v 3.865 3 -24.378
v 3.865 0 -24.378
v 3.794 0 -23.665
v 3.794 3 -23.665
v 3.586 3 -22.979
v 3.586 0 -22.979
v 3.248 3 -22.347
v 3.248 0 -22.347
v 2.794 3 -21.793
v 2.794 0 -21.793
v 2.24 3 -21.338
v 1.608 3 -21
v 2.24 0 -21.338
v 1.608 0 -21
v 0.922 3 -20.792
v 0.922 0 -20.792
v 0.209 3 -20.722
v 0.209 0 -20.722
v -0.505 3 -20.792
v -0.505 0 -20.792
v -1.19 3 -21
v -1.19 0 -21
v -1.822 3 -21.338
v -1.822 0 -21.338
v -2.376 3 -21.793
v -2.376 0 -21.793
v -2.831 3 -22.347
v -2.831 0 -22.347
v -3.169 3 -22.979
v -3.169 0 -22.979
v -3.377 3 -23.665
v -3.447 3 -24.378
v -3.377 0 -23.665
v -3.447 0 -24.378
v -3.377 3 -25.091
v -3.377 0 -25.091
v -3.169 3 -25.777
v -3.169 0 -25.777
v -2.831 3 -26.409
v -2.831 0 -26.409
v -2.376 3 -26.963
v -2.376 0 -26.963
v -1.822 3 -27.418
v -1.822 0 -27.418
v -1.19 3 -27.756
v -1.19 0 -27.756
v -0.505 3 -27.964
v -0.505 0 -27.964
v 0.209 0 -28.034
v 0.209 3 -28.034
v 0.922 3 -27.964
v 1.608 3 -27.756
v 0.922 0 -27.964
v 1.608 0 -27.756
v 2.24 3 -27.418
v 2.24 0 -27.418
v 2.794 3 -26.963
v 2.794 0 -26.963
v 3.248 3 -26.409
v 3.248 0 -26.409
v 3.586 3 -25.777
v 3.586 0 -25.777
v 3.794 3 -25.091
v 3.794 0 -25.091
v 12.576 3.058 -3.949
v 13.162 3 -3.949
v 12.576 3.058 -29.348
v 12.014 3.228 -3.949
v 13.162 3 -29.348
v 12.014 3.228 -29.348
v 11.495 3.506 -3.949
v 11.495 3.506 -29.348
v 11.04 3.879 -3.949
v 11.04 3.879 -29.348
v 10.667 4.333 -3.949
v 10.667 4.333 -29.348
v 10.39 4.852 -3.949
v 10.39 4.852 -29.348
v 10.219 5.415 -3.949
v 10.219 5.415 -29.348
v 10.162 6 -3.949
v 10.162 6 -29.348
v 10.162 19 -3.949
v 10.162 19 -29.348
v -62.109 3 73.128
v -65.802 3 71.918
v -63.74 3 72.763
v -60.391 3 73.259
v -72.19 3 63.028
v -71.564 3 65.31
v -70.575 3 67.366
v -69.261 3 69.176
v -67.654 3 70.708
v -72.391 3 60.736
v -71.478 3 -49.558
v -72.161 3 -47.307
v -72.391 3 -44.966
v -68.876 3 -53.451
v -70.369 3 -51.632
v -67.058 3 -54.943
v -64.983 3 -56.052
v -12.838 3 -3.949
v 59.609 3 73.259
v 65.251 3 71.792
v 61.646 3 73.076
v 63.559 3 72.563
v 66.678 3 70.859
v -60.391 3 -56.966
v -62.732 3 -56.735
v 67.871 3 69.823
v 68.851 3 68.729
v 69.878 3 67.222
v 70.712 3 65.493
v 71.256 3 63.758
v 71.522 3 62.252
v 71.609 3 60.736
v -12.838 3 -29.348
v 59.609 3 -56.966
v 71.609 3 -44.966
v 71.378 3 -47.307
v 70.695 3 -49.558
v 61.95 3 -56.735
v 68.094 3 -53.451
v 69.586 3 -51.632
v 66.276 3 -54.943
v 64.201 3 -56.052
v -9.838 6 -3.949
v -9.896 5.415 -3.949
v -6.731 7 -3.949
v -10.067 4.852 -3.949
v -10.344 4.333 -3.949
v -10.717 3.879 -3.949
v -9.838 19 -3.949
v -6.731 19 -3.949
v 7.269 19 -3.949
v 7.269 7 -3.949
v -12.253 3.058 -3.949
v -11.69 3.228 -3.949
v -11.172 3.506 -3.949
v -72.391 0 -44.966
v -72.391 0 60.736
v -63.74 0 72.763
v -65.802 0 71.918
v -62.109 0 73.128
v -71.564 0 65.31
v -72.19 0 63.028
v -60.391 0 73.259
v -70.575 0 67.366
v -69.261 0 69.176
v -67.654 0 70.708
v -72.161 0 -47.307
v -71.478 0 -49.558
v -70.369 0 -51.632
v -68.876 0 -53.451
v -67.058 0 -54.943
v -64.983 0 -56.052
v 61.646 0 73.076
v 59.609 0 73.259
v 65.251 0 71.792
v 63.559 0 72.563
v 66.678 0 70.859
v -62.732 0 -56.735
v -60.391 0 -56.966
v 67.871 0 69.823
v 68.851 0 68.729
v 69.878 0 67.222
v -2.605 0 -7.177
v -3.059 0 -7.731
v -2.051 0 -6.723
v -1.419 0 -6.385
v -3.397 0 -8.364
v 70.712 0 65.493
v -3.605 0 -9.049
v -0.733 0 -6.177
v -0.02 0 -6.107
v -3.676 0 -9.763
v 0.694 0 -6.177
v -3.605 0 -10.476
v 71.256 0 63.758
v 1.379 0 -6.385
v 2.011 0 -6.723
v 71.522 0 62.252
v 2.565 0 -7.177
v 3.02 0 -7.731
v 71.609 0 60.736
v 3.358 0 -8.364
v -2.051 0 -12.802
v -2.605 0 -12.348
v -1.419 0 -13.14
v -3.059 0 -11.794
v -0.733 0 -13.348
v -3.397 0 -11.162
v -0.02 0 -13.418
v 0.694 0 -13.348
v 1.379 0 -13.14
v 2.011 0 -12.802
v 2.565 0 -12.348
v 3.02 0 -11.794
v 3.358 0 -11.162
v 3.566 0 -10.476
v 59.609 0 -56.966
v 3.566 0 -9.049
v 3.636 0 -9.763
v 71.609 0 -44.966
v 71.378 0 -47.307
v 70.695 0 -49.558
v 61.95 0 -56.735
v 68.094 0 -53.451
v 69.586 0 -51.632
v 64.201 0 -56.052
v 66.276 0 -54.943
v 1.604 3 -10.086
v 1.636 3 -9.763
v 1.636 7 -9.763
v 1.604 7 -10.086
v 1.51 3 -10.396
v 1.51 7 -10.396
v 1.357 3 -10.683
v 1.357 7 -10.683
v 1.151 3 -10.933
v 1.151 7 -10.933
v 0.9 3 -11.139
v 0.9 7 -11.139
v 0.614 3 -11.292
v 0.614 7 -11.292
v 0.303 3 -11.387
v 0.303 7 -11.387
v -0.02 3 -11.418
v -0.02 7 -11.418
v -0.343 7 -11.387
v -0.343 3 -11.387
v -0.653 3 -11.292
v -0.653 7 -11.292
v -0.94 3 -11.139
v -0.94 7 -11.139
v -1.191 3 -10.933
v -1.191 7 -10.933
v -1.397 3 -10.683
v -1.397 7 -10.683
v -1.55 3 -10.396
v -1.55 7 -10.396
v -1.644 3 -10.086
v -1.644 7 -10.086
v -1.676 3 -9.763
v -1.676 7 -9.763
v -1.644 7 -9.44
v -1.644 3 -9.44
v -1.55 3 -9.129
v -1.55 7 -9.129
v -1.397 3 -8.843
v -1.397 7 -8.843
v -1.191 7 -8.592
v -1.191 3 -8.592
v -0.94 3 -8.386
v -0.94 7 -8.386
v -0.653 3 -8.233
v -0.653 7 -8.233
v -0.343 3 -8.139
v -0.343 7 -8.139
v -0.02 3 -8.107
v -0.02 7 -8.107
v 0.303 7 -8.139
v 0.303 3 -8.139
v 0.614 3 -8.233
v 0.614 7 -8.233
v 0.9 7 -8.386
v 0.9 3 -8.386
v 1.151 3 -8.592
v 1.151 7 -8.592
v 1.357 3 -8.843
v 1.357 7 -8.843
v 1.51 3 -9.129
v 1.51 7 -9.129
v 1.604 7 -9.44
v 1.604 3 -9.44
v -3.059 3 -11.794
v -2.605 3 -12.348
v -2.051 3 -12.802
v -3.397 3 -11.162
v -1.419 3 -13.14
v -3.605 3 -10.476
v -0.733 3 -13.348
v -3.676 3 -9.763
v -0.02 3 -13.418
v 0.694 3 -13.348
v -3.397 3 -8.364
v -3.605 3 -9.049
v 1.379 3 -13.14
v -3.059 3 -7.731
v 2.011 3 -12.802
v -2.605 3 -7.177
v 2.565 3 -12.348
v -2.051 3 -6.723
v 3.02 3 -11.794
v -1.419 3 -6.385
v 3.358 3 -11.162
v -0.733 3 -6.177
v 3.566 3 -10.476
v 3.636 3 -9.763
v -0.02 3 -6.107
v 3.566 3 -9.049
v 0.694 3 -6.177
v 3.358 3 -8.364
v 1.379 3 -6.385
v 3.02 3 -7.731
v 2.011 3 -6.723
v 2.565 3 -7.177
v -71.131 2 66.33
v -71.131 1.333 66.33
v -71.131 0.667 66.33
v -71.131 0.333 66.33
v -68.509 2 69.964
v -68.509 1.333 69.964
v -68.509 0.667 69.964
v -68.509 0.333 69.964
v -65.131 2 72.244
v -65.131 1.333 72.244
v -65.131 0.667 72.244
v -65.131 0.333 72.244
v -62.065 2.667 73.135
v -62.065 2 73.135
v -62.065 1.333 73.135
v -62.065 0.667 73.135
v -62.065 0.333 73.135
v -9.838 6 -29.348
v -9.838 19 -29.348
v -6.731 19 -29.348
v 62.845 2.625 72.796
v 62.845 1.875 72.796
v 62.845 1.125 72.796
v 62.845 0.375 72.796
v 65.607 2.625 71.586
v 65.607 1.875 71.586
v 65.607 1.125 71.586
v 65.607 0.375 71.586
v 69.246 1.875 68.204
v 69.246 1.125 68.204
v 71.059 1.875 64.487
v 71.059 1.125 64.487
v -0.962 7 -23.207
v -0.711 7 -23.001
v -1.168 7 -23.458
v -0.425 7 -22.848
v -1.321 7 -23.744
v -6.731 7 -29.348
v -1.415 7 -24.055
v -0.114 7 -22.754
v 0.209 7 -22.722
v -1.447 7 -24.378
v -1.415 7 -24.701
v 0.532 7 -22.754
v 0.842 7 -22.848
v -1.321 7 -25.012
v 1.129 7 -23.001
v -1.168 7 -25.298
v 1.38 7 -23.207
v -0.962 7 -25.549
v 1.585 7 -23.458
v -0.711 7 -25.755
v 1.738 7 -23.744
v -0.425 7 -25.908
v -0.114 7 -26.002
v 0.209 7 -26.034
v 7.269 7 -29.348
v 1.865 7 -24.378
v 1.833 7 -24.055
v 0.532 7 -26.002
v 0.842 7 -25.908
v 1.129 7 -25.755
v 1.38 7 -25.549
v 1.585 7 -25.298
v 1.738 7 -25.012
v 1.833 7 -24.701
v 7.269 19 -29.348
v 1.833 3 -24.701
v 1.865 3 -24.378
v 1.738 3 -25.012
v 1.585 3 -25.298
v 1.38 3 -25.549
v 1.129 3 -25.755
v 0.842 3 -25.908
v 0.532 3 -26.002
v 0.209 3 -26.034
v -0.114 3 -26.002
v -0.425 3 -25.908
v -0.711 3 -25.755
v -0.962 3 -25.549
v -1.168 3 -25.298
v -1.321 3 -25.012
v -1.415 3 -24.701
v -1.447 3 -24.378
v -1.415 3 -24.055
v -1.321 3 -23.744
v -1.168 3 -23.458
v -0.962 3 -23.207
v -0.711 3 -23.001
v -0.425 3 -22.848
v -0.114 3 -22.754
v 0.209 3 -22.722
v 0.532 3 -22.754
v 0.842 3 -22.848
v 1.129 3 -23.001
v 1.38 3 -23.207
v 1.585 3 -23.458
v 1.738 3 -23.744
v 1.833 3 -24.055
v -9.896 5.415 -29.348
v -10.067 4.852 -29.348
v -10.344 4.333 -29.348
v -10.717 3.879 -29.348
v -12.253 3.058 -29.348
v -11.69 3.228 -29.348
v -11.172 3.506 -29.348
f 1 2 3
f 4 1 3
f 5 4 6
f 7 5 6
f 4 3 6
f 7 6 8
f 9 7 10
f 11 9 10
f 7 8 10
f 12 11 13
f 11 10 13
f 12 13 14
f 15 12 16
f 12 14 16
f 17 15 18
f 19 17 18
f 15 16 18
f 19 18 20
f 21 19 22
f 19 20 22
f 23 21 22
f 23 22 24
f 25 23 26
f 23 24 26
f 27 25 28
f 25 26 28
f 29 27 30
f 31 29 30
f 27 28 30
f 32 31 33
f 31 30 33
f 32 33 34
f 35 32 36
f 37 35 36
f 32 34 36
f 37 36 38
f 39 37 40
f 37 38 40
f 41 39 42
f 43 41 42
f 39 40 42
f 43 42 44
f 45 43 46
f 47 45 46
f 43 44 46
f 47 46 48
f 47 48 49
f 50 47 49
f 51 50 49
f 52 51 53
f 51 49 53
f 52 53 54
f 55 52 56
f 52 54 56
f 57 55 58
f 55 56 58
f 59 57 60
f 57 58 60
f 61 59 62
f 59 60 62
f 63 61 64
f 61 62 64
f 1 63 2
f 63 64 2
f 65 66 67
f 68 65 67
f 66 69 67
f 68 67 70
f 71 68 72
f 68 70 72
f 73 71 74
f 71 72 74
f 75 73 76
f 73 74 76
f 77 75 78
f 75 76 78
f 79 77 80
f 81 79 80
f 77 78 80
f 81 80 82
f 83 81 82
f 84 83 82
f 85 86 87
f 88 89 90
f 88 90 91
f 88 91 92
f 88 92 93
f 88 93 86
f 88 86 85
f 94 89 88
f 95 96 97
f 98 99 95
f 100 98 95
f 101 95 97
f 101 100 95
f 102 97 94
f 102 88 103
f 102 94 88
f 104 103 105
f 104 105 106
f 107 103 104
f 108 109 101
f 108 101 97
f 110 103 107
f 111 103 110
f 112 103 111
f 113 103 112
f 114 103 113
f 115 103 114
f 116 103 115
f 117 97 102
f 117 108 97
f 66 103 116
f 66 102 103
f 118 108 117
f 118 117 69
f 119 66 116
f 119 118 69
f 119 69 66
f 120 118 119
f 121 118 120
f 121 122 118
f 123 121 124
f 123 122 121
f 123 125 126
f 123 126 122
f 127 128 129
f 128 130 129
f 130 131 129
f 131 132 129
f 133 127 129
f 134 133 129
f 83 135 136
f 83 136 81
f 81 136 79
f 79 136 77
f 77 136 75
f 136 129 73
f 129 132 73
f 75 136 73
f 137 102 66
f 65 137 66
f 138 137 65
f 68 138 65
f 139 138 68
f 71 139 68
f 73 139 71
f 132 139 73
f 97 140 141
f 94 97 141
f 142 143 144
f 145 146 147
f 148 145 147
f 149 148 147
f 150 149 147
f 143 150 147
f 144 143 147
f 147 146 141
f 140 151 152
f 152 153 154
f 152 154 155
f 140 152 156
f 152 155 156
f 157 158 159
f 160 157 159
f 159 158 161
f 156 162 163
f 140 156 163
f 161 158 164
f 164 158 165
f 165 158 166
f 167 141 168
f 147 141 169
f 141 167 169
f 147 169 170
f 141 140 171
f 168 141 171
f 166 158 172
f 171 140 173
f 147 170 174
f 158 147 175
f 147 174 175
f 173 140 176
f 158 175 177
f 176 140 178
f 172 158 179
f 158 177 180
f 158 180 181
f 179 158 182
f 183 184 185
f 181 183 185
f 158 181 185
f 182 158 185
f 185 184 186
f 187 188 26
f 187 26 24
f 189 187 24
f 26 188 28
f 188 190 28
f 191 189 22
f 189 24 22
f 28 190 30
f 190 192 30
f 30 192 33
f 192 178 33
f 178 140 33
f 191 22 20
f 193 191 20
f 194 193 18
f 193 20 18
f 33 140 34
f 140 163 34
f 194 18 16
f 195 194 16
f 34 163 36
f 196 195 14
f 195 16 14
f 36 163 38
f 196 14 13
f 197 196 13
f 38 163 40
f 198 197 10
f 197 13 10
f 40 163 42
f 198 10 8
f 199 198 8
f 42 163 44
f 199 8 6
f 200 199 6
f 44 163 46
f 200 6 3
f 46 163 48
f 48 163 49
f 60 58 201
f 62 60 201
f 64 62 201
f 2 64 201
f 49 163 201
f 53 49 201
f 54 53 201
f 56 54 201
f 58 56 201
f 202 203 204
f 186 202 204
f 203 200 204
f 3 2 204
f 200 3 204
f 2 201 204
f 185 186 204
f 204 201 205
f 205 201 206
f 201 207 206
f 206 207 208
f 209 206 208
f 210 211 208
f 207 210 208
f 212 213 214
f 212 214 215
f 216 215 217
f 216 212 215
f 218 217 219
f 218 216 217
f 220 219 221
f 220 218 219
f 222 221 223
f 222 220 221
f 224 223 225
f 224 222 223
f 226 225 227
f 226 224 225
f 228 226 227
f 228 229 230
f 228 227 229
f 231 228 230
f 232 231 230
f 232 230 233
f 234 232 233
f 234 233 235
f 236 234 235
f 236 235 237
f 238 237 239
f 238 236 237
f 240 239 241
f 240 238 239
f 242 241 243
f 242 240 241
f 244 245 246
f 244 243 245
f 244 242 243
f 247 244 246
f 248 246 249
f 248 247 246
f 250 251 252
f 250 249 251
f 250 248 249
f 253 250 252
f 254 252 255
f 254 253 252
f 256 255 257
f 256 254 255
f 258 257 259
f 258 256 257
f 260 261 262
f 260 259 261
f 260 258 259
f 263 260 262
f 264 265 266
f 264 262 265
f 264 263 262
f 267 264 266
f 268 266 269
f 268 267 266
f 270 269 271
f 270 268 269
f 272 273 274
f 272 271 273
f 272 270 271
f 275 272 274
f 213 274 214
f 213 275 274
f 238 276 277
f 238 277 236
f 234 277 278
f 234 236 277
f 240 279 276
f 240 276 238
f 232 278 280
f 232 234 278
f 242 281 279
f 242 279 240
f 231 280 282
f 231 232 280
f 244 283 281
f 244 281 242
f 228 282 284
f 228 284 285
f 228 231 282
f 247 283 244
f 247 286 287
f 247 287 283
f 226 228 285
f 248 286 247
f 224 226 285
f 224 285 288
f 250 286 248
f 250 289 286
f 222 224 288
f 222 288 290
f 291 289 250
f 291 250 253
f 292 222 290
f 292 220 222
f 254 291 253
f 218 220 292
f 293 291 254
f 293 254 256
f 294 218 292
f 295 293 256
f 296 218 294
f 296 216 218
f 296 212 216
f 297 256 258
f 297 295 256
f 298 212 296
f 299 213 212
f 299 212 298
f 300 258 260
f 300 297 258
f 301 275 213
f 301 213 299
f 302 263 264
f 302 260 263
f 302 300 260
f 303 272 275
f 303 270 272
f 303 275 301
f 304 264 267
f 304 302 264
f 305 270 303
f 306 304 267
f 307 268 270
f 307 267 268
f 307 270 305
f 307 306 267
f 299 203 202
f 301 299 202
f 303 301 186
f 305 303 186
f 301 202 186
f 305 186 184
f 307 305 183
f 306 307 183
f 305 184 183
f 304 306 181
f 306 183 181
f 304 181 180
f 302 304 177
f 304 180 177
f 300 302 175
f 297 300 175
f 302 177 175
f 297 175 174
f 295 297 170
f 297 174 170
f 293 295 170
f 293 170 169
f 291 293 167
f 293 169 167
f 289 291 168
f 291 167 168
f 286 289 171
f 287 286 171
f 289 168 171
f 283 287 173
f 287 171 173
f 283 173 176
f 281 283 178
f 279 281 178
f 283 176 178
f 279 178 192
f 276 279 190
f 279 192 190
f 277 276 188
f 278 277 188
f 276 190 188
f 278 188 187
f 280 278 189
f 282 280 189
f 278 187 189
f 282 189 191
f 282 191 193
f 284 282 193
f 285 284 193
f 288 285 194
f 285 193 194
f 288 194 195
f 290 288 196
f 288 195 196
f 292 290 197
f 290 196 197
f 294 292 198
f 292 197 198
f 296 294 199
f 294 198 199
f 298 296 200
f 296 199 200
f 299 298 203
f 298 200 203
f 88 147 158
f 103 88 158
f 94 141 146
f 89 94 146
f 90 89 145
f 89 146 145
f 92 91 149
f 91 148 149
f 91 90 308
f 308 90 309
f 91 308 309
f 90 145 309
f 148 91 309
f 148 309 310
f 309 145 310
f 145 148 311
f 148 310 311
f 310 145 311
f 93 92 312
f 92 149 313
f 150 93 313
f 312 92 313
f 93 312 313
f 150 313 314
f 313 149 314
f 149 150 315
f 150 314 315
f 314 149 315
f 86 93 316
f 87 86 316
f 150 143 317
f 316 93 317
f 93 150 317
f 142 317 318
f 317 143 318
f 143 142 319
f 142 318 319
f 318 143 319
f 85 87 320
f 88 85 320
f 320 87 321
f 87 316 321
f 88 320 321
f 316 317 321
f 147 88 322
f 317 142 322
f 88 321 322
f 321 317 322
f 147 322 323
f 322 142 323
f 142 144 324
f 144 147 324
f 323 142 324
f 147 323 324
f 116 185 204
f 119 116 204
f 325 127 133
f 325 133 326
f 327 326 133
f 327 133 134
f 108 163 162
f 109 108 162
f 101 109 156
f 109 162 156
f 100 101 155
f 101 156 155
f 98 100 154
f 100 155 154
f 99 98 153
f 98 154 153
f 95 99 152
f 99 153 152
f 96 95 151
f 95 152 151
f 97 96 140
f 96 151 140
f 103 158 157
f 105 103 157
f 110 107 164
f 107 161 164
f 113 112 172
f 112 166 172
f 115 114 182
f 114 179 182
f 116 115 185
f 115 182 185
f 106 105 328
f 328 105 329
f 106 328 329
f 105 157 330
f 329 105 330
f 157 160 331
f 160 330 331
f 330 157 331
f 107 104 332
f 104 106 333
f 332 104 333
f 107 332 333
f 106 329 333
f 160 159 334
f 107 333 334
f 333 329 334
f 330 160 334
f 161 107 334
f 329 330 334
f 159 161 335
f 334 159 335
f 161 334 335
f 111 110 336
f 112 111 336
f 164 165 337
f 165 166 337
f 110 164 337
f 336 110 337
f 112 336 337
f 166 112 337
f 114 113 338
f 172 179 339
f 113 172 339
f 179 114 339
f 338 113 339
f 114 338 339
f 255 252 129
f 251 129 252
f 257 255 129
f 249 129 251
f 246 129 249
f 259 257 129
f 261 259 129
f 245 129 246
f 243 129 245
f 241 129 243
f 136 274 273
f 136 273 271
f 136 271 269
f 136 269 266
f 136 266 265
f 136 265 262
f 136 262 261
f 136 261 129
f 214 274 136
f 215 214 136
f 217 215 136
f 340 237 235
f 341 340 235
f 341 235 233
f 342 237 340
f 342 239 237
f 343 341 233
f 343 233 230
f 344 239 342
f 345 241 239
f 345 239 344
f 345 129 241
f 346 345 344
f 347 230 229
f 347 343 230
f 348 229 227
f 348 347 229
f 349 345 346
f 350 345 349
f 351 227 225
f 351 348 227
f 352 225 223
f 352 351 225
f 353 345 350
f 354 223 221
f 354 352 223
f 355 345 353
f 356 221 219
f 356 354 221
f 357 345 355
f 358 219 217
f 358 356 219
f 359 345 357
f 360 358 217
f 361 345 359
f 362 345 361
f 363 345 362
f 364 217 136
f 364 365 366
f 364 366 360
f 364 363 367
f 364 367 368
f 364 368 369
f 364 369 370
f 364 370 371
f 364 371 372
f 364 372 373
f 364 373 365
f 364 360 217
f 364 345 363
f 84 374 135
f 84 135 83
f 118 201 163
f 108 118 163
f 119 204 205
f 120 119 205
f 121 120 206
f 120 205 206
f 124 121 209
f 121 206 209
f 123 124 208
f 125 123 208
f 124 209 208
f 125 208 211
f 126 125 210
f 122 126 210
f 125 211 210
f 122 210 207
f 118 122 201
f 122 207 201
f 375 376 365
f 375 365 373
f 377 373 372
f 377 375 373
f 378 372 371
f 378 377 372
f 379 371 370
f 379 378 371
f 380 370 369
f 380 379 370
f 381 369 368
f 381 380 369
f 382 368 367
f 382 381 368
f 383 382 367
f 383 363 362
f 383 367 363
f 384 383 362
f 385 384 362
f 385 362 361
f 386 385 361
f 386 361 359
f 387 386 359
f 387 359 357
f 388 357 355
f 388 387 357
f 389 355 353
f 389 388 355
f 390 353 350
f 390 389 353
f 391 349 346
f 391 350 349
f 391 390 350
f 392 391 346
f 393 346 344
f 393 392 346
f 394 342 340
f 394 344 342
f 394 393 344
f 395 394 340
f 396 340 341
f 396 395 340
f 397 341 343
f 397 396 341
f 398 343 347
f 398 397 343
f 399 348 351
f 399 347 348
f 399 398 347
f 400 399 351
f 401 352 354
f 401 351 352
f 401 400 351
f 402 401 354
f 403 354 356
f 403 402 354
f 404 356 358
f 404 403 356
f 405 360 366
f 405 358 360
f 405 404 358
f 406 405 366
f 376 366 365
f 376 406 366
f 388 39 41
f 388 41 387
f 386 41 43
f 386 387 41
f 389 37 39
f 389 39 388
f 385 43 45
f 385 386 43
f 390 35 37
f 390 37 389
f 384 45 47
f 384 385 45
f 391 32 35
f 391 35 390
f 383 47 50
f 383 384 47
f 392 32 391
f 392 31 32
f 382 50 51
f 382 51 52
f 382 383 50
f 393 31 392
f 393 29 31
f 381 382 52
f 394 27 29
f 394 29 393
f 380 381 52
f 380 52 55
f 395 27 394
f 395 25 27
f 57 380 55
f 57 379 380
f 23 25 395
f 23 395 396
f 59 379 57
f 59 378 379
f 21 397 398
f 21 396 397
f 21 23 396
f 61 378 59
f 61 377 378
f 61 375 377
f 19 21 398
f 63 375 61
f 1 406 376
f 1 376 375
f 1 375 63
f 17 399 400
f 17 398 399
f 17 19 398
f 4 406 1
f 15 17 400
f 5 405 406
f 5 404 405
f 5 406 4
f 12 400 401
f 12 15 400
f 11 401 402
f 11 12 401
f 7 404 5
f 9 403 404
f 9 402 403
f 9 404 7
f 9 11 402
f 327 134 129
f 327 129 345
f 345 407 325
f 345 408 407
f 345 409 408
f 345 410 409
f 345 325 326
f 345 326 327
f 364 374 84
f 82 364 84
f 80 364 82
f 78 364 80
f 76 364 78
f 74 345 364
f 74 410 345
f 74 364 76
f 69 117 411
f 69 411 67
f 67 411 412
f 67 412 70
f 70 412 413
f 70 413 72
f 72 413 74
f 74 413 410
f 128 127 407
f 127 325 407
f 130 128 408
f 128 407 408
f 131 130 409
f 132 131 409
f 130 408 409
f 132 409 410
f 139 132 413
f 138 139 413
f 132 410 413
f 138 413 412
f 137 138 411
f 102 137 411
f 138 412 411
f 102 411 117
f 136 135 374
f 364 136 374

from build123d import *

# Parameters (mm, degrees)
SKETCH1_R           = 1.655864604
BOSS_EXTRUDE1_DEPTH = 3
SKETCH2_W           = 20
SKETCH2_H           = 25.399582392
SKETCH2_R           = 1.655864604
BOSS_EXTRUDE2_DEPTH = 16
SKETCH3_W           = 14
SKETCH3_H           = 30.433665038
CUT_EXTRUDE1_DEPTH  = 12
FILLET1_R           = 3
SKETCH4_R           = 3.655864604
CUT_EXTRUDE2_DEPTH  = 3


with BuildPart() as part:
    # Sketch1 → Boss-Extrude1 (new body)
    with BuildSketch(Plane(origin=(0, 0, 0), x_dir=(1, 0, 0), z_dir=(0, 1, 0))):
        with BuildLine():
            Line((-72.391156815, 44.965534322), (-72.391156815, -60.735574691))
            add(Edge.make_bspline(
                [(-72.391156815, -60.735574691), (-72.391156815, -61.992108225), (-72.131767652, -63.841263996), (-71.193134075, -66.331246924), (-70.115754462, -68.193455339), (-68.602916824, -69.990155744), (-66.871043197, -71.356237465), (-65.167773111, -72.264127558), (-63.671954883, -72.82246992), (-62.083143976, -73.170982974), (-60.950569944, -73.258988683), (-60.391156815, -73.258988683)],
                knots=[0, 0, 0, 0, 0.25, 0.375, 0.5, 0.625, 0.75, 0.8125, 0.875, 0.9375, 1, 1, 1, 1], degree=3))
            Line((-60.391156815, -73.258988683), (59.608843185, -73.258988683))
            add(Edge.make_bspline(
                [(59.608843185, -73.258988683), (60.161825687, -73.258988683), (61.27919765, -73.173963171), (62.86030745, -72.830650997), (64.348694962, -72.279953513), (66.061771772, -71.375336188), (67.804355953, -70.006238159), (69.822626853, -67.61666824), (71.258952654, -64.479060557), (71.608843185, -61.999282855), (71.608843185, -60.735574691)],
                knots=[0, 0, 0, 0, 0.0625, 0.125, 0.1875, 0.25, 0.375, 0.5, 0.75, 1, 1, 1, 1], degree=3))
            Line((71.608843185, -60.735574691), (71.608843185, 44.965534322))
            ThreePointArc((71.608843185, 44.965534322), (68.094124559, 53.450815696), (59.608843185, 56.965534322))
            Line((59.608843185, 56.965534322), (-60.391156815, 56.965534322))
            ThreePointArc((-60.391156815, 56.965534322), (-68.876438189, 53.450815696), (-72.391156815, 44.965534322))
        make_face()
        with Locations((0.208651948, 24.377980521)):
            Circle(SKETCH1_R, mode=Mode.SUBTRACT)
        with Locations((-0.01971378, 9.762573941)):
            Circle(SKETCH1_R, mode=Mode.SUBTRACT)
    extrude(amount=BOSS_EXTRUDE1_DEPTH)

    # Sketch2 → Boss-Extrude2 (add)
    with BuildSketch(Plane(origin=(0, 3, 0), x_dir=(1, 0, 0), z_dir=(0, 1, 0))):
        with Locations((0.161550821, 16.648607969)):
            Rectangle(SKETCH2_W, SKETCH2_H)
        with Locations((-0.01971378, 9.762573941)):
            Circle(SKETCH2_R, mode=Mode.SUBTRACT)
        with Locations((0.208651948, 24.377980521)):
            Circle(SKETCH2_R, mode=Mode.SUBTRACT)
    extrude(amount=BOSS_EXTRUDE2_DEPTH)

    # Sketch3 → Cut-Extrude1 (cut)
    with BuildSketch(Plane(origin=(0, 19, 0), x_dir=(1, 0, 0), z_dir=(0, 1, 0))):
        with Locations((0.269010393, 16.661700324)):
            Rectangle(SKETCH3_W, SKETCH3_H)
    extrude(amount=-CUT_EXTRUDE1_DEPTH, mode=Mode.SUBTRACT)

    # Fillet1
    fillet1_edges = [part.edges().sort_by_distance(p)[0] for p in [
        (-9.838449179, 3, -16.648607969),
        (10.161550821, 3, -16.648607969),
    ]]
    fillet(fillet1_edges, radius=FILLET1_R)

    # Sketch4 → Cut-Extrude2 (cut)
    with BuildSketch(Plane.XZ):
        with Locations((-0.01971378, -9.762573941)):
            Circle(SKETCH4_R)
        with Locations((0.208651948, -24.377980521)):
            Circle(SKETCH4_R)
    extrude(amount=-CUT_EXTRUDE2_DEPTH, mode=Mode.SUBTRACT)


solid = part.part
